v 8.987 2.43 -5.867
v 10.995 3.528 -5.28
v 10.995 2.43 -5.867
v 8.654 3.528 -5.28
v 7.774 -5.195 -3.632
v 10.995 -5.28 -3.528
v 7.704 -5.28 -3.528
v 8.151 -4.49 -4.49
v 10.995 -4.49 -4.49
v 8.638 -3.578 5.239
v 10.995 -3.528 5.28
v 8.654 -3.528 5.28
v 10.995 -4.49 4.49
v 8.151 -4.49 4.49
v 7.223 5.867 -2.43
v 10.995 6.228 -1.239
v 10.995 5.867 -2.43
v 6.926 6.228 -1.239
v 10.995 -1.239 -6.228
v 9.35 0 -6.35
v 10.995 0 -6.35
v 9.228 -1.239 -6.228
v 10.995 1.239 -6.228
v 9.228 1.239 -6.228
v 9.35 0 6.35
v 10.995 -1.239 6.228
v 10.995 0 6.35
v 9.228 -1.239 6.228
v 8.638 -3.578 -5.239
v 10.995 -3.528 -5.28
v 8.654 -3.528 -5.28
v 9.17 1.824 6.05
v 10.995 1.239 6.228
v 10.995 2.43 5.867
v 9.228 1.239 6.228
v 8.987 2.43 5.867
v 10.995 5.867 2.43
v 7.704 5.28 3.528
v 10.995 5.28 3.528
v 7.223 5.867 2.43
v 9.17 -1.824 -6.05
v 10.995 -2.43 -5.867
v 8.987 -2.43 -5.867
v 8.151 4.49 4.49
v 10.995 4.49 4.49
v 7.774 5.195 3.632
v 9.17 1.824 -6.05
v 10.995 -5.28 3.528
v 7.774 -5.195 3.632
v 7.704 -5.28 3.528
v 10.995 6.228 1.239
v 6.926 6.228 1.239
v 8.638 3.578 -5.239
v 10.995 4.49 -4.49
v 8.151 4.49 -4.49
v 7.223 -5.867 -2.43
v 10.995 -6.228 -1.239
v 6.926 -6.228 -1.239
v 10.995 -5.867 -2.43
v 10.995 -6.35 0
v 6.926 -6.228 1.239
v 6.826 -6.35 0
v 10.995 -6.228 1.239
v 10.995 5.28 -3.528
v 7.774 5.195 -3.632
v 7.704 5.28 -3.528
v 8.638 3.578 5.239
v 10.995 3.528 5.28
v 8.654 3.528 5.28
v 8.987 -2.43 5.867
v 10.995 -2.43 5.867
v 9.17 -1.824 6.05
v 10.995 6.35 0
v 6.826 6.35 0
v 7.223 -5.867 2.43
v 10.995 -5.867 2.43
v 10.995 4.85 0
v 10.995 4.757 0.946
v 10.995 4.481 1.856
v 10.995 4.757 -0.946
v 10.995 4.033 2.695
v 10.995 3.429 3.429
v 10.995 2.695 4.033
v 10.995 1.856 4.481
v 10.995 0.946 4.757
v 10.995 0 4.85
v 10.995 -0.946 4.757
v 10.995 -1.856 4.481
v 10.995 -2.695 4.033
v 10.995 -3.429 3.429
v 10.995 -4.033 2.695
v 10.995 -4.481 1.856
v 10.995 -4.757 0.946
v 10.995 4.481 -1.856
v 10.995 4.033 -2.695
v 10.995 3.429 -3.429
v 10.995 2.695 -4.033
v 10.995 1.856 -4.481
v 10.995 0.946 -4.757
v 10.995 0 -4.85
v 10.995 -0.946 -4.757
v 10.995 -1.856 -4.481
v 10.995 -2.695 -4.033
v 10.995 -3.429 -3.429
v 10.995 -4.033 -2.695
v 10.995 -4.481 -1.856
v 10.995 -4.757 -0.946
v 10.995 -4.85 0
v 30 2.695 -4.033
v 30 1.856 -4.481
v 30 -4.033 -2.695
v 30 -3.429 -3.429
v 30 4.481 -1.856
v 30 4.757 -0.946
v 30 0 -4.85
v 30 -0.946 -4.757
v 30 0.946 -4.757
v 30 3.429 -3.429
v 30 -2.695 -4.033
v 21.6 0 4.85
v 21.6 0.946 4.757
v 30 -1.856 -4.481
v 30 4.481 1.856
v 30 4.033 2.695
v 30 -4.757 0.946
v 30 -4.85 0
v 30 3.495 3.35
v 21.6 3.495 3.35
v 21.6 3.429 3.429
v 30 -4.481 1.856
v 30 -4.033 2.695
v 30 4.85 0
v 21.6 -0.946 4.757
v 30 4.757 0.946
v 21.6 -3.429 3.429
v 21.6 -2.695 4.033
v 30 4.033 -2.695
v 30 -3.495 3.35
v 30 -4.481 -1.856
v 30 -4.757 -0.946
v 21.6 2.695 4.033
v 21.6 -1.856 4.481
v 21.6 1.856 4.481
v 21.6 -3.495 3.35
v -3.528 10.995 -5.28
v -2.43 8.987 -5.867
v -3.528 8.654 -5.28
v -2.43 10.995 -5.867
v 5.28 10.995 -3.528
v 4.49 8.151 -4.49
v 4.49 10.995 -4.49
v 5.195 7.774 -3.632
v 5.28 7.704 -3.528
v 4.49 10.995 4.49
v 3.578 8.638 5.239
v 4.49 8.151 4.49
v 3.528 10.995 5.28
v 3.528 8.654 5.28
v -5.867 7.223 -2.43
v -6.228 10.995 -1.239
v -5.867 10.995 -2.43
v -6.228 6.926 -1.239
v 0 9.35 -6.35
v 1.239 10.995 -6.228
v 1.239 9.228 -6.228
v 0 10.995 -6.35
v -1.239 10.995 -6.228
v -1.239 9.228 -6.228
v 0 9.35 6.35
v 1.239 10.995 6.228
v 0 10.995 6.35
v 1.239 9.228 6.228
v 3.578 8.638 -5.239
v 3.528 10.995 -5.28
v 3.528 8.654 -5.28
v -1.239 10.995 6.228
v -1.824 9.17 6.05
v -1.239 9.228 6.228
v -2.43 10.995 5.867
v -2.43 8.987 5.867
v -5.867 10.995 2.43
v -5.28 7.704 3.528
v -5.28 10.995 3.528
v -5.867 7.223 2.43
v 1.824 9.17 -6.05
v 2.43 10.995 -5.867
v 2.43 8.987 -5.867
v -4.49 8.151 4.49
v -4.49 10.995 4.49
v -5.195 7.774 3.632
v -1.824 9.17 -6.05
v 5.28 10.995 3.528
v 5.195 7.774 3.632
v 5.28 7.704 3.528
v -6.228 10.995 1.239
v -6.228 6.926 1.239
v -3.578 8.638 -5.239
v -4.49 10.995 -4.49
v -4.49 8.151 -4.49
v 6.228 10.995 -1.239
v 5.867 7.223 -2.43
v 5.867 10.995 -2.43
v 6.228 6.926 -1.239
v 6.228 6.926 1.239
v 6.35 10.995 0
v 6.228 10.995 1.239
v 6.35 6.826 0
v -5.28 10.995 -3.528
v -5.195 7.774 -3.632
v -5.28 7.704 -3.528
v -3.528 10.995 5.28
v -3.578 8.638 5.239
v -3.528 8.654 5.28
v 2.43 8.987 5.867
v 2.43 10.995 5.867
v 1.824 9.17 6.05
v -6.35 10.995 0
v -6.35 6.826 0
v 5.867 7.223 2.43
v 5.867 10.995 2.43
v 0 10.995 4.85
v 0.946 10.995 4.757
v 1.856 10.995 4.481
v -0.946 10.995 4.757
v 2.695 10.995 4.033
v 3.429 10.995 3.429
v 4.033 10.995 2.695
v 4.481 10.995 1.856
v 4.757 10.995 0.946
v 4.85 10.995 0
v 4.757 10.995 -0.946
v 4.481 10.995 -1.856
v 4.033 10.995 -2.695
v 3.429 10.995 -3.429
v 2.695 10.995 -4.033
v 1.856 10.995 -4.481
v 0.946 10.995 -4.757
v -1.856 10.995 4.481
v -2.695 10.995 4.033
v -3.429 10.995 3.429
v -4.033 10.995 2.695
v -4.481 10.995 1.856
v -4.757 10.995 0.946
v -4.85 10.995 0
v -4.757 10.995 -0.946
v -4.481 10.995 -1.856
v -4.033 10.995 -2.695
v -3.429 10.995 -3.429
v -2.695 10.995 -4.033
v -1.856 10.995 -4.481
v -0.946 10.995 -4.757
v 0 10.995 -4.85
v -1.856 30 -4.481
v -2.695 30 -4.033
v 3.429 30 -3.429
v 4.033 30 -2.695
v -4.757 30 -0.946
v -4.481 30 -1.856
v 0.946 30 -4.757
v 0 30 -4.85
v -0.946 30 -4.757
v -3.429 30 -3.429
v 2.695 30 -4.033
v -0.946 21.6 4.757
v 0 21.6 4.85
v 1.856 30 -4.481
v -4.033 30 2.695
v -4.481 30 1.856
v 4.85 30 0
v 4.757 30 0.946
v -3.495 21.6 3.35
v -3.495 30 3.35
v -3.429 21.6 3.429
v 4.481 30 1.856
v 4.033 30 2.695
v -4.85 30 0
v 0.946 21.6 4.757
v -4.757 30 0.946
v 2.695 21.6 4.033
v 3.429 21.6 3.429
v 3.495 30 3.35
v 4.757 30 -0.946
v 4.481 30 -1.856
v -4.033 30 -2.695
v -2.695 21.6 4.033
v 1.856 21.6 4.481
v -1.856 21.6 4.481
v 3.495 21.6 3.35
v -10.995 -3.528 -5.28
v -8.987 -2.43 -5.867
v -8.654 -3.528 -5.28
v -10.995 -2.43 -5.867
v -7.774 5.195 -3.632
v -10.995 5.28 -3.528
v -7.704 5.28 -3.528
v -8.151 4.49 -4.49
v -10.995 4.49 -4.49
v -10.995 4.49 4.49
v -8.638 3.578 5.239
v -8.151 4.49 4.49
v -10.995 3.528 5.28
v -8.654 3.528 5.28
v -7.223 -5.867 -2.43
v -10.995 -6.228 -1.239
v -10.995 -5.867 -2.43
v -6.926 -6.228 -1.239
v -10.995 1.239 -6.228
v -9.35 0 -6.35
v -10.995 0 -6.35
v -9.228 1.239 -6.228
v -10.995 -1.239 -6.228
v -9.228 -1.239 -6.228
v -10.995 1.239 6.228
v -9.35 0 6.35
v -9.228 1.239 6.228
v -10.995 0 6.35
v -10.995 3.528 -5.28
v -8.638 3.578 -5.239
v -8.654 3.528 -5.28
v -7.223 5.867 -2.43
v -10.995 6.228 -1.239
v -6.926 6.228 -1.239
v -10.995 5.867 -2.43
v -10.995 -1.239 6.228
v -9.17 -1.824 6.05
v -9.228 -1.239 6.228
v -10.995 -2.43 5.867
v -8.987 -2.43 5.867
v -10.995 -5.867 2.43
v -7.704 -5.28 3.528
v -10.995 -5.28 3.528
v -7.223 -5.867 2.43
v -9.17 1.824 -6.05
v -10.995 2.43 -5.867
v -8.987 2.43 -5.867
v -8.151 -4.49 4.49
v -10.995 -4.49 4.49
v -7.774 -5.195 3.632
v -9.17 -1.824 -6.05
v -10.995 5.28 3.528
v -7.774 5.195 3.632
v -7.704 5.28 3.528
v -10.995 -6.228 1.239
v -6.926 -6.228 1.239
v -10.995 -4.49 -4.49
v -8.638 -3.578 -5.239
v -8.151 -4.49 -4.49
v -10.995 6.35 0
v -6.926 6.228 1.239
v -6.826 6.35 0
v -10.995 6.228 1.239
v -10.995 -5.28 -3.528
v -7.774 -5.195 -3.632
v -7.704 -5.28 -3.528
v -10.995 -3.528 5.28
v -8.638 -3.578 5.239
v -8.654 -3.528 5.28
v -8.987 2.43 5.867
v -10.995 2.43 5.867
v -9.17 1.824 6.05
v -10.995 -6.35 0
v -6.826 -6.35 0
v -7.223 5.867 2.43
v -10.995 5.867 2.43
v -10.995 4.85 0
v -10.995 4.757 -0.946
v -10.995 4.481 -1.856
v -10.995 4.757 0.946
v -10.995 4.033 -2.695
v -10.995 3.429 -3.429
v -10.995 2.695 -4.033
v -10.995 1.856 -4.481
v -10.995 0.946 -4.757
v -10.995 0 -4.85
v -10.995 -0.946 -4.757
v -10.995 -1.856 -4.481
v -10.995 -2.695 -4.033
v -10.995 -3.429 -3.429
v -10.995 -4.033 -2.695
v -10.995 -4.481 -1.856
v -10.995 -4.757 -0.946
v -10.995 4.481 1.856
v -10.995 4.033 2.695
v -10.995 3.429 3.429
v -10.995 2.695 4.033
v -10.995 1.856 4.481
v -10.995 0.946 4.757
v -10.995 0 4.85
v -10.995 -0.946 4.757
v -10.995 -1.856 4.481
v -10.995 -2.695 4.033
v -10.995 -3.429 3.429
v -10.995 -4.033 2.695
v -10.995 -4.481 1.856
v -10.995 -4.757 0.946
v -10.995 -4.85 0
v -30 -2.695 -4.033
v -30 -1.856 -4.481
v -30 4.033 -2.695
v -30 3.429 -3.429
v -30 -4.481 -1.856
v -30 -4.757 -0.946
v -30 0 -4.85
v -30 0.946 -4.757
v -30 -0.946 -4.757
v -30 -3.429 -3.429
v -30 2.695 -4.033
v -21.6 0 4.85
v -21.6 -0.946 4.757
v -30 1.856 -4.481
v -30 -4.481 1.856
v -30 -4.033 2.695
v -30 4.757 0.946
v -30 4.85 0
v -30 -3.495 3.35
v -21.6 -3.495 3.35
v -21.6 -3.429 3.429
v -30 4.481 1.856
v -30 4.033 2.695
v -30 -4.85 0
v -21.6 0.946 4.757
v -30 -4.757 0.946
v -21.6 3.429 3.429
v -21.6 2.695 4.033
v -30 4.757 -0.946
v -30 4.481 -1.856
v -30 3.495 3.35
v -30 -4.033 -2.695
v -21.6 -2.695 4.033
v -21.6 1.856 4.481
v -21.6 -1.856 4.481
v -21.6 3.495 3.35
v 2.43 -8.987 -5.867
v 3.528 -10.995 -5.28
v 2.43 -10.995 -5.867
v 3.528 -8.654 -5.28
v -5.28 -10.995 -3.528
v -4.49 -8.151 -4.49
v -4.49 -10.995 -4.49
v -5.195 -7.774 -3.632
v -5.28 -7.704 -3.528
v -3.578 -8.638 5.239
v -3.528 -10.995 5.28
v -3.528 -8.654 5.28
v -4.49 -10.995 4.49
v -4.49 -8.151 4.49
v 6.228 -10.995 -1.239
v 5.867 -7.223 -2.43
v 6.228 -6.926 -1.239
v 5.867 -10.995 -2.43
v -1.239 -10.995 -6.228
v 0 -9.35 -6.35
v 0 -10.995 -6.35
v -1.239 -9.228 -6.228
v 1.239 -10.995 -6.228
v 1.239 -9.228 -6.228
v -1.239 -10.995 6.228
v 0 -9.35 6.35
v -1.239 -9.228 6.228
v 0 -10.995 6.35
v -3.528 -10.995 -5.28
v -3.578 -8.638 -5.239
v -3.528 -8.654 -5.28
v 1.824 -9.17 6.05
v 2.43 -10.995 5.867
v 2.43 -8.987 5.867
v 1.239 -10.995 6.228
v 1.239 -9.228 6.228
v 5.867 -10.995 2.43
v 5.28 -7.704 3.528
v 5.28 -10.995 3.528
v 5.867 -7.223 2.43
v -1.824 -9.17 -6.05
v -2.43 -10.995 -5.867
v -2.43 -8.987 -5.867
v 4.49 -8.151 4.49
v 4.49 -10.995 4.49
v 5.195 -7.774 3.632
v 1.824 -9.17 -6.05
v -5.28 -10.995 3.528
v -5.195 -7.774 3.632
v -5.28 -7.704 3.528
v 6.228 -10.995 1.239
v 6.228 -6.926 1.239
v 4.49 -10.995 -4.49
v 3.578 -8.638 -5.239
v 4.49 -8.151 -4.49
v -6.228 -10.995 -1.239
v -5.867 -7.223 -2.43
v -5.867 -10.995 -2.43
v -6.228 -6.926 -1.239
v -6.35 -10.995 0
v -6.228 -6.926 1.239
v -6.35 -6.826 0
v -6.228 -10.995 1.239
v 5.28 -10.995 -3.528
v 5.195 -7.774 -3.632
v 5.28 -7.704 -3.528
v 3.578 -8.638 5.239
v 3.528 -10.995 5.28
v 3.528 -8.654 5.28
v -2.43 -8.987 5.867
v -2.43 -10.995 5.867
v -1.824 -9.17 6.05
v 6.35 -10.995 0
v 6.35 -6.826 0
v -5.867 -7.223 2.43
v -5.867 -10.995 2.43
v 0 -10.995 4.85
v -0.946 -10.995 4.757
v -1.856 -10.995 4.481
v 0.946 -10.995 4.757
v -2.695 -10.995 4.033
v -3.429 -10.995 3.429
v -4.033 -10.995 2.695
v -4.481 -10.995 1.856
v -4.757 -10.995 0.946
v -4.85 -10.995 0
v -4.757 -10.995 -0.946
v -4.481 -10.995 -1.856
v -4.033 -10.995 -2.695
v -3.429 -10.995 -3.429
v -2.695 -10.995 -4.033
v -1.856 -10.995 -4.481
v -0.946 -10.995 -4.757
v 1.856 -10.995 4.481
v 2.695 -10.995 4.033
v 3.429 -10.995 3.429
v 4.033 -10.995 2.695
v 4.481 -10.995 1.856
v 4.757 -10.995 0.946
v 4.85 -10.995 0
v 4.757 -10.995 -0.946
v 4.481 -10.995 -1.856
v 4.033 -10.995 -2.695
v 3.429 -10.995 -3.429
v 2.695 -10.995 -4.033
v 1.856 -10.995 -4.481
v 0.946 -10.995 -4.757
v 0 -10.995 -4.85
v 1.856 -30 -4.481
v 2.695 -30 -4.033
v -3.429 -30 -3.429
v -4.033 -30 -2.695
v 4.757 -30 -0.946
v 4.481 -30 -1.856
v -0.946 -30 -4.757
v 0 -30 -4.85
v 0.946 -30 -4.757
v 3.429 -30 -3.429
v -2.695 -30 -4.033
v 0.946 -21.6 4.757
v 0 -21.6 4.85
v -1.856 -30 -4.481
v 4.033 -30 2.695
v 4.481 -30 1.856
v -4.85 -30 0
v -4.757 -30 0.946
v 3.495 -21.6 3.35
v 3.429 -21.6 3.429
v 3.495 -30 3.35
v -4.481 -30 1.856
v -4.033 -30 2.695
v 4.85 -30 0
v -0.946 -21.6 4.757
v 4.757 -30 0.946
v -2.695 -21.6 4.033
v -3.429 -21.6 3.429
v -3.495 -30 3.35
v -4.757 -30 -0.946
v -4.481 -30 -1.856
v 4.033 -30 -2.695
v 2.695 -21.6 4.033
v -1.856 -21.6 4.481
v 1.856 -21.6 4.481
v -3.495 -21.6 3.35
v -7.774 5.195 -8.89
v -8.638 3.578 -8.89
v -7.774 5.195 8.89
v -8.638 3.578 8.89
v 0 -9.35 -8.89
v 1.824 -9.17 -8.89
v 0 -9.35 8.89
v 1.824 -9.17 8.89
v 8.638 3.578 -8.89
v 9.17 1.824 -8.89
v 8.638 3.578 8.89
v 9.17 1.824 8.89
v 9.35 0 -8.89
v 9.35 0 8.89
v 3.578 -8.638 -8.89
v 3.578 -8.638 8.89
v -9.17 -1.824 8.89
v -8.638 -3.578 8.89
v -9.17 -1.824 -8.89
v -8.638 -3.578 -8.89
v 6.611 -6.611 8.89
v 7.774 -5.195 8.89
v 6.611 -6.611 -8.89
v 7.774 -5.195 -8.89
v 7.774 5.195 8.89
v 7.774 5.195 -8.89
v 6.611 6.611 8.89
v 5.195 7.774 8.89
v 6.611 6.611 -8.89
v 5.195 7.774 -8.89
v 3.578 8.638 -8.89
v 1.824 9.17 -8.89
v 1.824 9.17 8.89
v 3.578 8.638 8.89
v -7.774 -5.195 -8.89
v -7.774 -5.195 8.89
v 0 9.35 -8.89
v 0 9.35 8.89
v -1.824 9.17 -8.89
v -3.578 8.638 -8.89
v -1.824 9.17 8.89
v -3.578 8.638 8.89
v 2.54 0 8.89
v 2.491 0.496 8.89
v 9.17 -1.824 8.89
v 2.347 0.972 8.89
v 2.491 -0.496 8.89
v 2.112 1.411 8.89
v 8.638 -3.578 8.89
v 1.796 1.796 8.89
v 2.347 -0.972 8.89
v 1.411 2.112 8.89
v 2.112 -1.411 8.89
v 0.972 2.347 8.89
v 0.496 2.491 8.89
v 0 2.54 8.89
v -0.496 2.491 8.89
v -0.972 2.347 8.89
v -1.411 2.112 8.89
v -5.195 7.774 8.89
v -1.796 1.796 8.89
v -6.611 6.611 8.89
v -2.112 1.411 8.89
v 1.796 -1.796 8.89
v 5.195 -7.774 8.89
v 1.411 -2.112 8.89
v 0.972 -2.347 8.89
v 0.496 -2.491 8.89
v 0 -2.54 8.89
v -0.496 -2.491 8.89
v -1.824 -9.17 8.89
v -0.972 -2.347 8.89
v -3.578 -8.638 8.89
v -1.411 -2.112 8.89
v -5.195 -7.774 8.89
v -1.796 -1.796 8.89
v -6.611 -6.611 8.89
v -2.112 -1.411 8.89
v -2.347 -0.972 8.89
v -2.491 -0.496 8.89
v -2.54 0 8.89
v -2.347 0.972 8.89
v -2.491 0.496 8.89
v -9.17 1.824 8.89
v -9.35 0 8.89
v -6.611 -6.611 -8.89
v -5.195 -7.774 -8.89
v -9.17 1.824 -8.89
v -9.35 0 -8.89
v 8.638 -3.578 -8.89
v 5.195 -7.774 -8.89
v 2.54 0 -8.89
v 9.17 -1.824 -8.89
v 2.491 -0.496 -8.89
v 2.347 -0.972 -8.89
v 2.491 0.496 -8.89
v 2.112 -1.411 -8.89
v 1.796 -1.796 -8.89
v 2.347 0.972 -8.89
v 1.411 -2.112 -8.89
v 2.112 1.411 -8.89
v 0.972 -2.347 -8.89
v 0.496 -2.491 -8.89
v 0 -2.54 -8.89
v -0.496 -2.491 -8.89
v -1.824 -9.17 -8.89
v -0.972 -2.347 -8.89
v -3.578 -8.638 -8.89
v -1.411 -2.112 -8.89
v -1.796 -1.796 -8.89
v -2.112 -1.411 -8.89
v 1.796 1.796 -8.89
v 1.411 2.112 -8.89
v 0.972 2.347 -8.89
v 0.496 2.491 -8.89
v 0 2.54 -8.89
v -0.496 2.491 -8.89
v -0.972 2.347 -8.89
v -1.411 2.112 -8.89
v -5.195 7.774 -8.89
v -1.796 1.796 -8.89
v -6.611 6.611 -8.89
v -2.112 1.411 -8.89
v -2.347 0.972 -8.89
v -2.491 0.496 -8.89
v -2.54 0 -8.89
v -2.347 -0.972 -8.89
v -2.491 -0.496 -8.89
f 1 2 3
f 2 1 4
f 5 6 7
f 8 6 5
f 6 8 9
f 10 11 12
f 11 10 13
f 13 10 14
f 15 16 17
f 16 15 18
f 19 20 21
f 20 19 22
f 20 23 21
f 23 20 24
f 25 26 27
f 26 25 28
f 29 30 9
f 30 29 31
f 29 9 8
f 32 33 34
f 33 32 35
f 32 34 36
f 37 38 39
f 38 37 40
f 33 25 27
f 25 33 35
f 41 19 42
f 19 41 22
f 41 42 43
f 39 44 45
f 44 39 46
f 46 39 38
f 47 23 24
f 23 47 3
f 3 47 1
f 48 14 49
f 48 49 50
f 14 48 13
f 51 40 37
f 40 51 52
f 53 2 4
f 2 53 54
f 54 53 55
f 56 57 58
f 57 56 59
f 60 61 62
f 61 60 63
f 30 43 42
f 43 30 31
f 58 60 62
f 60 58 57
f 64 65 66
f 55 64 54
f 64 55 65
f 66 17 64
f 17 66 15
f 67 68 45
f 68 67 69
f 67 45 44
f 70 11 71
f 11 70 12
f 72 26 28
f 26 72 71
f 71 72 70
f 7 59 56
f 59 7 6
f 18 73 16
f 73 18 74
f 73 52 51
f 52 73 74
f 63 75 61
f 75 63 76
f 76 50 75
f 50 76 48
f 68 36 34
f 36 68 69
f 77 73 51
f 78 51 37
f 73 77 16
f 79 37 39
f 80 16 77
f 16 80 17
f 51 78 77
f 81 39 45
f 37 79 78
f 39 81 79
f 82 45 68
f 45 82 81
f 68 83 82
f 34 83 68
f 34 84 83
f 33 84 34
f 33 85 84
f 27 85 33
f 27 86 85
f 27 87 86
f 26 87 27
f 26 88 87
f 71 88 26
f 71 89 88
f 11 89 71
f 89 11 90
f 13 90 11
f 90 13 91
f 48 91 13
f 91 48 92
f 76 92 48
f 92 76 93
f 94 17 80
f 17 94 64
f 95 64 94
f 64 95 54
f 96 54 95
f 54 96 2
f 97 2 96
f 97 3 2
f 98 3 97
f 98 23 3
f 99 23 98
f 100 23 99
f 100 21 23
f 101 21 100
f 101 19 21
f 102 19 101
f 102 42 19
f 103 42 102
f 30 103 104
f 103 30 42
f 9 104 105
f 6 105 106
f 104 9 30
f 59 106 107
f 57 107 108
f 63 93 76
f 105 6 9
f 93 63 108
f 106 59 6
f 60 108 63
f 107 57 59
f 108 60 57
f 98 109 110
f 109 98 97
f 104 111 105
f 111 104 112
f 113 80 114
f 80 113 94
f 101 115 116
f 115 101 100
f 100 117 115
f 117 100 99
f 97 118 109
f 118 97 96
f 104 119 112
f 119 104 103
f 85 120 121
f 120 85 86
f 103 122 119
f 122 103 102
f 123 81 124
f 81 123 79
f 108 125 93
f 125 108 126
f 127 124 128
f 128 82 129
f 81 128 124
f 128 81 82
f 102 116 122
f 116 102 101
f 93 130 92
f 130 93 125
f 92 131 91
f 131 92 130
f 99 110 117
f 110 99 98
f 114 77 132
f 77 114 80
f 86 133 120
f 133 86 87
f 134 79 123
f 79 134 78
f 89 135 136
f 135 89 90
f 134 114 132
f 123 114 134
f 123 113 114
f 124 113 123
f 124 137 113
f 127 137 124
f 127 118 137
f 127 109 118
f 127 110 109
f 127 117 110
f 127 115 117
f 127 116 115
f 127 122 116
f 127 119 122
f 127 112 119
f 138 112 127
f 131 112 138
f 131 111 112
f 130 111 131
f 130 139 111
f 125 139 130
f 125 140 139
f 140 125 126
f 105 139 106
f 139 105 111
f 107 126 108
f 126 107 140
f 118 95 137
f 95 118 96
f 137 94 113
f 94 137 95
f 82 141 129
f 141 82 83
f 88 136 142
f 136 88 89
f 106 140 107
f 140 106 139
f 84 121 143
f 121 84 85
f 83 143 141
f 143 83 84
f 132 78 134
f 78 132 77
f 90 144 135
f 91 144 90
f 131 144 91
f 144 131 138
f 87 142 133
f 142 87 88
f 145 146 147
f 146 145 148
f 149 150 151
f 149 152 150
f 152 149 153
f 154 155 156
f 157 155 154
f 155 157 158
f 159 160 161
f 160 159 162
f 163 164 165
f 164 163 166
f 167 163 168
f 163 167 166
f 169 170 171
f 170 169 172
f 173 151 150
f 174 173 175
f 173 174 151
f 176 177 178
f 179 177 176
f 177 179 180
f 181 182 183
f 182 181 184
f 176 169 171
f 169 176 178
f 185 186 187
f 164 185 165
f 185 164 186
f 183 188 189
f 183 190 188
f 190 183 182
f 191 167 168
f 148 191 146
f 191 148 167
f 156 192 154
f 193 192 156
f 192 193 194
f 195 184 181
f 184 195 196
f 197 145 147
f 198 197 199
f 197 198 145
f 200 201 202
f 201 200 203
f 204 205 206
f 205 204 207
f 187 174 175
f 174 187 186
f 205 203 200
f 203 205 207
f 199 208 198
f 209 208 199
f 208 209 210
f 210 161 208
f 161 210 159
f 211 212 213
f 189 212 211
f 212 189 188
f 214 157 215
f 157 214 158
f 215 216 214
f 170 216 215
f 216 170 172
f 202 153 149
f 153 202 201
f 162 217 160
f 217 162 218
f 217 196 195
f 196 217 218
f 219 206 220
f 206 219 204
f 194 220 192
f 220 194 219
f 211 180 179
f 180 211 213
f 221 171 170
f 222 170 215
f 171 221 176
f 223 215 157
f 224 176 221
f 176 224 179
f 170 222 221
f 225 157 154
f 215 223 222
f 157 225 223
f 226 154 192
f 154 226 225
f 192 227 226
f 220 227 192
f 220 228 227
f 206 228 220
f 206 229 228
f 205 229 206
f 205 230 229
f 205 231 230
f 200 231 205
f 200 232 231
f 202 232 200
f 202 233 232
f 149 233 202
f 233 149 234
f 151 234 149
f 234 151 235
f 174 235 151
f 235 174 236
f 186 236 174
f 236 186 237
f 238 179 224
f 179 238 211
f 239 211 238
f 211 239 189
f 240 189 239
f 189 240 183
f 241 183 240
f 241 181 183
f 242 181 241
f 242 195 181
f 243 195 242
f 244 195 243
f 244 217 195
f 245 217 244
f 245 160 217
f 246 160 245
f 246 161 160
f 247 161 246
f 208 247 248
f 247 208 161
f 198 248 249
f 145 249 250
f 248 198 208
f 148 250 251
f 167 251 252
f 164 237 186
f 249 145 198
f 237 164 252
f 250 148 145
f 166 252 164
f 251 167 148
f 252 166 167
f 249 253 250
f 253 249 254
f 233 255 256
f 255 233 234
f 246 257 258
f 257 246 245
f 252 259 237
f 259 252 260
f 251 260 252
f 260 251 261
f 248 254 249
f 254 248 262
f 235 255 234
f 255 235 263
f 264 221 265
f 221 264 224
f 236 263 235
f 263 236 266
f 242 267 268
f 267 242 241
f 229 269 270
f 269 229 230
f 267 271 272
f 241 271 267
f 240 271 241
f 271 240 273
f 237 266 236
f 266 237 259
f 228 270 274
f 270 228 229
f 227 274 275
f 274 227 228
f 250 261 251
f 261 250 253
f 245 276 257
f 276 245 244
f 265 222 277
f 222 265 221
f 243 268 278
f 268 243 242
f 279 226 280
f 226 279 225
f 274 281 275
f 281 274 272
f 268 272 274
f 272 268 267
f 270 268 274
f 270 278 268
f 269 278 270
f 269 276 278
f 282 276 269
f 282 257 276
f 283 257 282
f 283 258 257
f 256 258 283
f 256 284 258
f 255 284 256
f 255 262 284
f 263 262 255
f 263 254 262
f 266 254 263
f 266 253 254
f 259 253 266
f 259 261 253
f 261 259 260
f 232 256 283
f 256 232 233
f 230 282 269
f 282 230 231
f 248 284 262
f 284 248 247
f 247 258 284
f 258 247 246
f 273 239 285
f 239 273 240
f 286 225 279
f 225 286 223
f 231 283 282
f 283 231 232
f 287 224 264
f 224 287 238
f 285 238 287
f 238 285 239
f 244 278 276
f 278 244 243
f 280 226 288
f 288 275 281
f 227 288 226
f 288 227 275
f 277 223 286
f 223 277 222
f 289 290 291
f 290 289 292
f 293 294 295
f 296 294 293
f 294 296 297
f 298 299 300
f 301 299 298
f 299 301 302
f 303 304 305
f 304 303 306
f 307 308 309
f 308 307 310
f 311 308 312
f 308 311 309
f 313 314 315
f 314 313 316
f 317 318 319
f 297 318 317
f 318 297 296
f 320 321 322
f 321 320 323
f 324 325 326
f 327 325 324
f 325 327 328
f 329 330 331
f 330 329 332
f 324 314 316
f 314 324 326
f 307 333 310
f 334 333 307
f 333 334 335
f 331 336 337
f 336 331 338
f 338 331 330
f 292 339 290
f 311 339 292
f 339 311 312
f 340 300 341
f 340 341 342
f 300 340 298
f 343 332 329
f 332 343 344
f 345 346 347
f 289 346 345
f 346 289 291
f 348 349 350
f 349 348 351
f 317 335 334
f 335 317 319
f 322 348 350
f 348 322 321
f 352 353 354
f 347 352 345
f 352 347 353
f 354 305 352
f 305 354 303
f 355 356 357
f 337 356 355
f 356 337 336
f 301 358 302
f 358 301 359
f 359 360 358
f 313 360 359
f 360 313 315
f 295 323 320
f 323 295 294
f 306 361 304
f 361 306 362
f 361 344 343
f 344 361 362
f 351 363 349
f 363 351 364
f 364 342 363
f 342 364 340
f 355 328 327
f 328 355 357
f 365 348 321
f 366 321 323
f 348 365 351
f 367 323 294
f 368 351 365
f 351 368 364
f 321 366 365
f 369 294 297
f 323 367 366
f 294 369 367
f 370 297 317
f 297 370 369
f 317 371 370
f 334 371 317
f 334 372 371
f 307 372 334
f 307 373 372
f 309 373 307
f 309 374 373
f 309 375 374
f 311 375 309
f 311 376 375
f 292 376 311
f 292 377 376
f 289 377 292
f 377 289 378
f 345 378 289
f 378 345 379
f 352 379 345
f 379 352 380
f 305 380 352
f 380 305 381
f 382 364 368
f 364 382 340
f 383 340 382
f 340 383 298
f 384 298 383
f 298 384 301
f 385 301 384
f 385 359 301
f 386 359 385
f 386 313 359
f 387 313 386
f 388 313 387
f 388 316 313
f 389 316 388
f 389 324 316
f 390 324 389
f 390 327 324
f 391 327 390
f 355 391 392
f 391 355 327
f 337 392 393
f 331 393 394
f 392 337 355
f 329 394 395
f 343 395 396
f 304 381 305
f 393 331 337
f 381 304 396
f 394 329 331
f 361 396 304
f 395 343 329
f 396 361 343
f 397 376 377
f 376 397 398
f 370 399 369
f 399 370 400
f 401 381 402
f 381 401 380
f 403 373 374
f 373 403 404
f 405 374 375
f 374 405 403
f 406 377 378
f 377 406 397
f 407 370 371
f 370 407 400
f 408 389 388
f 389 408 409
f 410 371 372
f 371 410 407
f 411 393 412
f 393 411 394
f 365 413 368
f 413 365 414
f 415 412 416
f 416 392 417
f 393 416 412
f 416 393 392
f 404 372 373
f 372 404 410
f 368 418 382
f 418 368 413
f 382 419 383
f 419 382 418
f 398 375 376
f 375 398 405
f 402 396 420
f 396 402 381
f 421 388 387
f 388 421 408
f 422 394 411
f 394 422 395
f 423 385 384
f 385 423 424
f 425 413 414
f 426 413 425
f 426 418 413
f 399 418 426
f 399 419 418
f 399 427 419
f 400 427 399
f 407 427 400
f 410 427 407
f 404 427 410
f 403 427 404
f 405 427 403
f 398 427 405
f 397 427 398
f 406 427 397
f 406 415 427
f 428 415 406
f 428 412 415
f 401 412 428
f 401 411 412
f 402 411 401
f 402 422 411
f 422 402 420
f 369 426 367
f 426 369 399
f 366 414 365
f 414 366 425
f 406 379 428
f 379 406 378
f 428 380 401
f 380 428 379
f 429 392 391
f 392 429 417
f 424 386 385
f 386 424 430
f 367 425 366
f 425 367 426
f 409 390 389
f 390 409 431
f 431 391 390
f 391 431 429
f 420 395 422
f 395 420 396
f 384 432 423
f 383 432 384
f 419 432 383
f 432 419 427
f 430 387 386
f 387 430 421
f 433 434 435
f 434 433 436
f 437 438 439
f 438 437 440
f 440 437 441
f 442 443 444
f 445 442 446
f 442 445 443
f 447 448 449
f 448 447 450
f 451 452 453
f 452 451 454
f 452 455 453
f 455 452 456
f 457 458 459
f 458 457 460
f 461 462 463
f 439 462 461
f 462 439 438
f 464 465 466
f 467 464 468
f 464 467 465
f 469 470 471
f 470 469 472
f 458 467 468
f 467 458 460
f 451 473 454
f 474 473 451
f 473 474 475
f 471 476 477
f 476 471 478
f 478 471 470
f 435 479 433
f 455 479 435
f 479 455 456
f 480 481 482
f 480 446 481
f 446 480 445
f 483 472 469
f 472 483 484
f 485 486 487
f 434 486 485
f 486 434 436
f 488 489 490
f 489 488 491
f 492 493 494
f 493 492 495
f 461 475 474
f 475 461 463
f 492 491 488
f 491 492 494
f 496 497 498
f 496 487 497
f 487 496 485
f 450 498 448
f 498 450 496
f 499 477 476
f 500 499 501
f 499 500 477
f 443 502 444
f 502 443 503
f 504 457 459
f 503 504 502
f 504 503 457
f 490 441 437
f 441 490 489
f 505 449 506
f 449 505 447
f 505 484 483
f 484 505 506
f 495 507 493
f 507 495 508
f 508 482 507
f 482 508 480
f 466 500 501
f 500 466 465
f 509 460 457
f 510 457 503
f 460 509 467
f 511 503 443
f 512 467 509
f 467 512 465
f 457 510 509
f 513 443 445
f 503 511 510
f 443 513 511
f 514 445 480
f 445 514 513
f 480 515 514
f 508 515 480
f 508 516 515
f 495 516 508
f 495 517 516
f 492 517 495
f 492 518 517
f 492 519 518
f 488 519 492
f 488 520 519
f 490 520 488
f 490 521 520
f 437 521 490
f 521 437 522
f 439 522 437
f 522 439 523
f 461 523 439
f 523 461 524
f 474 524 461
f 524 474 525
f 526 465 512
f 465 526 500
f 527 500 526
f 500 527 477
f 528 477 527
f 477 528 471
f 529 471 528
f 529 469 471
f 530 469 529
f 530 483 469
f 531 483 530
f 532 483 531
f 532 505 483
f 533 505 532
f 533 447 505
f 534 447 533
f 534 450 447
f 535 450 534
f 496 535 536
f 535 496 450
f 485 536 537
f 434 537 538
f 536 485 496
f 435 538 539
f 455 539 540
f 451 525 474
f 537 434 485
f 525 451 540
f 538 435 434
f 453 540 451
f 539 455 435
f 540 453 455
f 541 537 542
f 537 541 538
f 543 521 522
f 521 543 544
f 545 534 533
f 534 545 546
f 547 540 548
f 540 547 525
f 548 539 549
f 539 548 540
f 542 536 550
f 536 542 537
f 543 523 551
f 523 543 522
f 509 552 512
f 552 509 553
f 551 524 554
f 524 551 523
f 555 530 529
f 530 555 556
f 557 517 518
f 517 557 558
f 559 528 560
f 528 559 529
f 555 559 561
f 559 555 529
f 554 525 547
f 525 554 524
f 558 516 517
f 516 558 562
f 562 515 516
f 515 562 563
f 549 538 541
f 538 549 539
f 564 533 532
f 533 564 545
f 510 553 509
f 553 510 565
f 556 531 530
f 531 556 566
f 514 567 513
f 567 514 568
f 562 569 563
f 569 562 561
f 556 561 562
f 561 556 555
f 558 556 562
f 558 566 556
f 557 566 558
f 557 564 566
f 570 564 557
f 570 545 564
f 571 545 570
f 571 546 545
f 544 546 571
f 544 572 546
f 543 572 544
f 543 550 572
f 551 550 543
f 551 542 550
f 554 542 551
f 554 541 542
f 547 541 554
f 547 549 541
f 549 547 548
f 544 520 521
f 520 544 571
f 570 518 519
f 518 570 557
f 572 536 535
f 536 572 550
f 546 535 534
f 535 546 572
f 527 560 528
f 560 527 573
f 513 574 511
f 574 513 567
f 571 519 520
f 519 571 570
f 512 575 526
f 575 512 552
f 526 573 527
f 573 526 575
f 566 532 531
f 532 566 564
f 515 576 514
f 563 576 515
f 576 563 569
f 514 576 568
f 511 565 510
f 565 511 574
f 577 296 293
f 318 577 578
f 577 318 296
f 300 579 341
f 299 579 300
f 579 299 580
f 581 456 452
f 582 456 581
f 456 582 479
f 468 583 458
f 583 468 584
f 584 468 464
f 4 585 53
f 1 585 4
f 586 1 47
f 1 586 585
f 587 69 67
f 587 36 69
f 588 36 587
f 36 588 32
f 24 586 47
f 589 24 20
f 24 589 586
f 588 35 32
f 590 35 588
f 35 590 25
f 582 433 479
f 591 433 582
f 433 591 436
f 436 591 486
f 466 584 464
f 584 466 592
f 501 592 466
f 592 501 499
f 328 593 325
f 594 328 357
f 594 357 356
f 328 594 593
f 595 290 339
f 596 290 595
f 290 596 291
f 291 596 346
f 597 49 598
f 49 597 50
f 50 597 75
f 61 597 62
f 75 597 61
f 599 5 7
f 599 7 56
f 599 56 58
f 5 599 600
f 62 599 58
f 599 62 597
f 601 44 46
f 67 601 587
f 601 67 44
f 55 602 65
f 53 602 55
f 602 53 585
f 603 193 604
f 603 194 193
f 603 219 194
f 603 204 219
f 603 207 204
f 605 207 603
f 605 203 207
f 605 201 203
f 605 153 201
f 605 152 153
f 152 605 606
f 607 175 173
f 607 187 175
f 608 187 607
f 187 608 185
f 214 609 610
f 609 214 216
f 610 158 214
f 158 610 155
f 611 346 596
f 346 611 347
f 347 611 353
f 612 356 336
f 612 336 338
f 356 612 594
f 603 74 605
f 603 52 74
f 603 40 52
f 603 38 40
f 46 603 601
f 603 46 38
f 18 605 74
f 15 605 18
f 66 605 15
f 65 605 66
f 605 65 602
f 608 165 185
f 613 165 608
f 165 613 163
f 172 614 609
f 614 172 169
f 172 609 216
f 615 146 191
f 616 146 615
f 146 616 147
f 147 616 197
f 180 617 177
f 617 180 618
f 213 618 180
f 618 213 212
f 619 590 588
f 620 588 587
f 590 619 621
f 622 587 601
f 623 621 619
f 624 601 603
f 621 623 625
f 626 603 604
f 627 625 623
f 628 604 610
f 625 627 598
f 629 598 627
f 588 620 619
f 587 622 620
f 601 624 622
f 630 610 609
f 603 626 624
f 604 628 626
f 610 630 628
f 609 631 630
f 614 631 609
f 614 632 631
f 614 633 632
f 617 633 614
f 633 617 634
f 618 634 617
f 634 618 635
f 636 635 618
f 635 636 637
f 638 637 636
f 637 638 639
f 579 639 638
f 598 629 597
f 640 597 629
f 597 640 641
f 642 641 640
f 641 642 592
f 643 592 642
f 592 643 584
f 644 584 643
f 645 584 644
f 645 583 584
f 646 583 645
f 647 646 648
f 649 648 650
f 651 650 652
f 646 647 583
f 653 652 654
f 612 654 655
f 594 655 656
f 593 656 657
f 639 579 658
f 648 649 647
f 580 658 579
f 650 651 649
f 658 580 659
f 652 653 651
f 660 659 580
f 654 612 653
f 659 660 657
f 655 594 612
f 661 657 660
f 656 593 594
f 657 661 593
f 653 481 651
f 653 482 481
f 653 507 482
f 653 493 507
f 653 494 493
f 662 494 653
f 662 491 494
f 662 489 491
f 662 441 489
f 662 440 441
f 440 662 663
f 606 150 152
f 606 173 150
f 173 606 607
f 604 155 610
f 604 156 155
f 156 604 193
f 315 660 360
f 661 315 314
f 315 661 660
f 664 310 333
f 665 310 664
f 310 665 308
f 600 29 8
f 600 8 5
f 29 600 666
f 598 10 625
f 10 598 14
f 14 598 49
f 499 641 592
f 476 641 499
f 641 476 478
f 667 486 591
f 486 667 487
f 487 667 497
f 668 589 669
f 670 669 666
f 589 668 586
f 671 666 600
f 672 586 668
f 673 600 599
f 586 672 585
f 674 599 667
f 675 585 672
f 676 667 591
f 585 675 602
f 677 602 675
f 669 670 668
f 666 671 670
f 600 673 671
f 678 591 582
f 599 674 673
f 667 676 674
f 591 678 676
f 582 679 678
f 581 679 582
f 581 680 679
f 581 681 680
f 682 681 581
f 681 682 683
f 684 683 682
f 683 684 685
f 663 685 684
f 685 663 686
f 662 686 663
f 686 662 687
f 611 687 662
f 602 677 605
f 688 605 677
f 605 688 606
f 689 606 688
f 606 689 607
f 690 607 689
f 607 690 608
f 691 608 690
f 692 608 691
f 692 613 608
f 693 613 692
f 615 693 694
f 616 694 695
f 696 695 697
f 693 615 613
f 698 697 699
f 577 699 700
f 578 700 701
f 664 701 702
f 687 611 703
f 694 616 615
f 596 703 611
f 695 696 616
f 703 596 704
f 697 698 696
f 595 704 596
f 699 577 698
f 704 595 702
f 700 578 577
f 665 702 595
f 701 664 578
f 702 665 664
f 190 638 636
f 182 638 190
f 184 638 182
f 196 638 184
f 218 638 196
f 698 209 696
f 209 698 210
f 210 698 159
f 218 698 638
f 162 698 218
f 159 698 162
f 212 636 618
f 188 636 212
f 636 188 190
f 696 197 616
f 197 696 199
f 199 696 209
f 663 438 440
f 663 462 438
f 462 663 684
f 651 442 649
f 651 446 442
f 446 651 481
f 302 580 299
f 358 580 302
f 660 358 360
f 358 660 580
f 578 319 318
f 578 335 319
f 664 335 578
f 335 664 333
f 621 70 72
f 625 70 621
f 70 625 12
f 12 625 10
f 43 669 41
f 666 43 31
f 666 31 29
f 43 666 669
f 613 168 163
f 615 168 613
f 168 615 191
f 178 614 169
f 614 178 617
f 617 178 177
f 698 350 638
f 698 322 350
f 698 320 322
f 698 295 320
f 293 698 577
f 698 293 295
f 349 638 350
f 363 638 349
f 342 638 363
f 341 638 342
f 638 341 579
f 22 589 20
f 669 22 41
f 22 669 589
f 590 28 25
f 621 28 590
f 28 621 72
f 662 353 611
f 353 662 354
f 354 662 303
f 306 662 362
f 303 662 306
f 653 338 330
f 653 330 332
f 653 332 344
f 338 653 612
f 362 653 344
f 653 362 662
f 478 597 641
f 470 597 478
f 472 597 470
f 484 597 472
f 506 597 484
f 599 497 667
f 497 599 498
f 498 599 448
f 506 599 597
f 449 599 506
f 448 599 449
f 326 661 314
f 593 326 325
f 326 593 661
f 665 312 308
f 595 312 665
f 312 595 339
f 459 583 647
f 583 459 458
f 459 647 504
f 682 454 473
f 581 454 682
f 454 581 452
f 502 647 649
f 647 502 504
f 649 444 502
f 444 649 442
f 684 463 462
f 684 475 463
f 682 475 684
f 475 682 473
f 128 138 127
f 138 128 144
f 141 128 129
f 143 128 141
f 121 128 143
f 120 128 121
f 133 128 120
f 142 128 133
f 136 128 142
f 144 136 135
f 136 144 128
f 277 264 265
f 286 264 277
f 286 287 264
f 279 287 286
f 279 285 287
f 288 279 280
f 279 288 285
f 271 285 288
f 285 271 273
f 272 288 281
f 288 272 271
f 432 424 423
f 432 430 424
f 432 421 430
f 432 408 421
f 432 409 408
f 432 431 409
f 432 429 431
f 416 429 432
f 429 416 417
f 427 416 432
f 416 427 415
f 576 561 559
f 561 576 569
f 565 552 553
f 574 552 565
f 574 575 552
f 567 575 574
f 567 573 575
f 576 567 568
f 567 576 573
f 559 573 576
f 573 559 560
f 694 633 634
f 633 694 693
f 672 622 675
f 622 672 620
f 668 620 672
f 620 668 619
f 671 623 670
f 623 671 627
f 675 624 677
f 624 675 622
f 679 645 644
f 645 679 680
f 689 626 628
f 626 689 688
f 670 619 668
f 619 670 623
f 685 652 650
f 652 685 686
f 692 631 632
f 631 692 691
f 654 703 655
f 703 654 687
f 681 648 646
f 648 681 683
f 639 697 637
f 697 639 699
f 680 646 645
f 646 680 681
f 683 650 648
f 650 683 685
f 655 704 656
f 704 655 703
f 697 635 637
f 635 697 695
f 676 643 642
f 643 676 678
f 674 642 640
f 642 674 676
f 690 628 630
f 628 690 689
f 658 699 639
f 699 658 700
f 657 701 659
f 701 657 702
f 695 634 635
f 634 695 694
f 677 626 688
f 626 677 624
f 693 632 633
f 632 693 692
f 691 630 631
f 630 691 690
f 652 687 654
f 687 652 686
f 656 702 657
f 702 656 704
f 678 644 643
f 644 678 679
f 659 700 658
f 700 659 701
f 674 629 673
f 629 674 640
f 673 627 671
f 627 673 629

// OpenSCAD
$fn = 32;

// ----------------------------------------------------------------------
// Cardan cross: 60 mm span, 12.7 mm trunnions
// ----------------------------------------------------------------------

// --- parameters (mm) ---
journal_d = 12.7;         // trunnion diameter
arm_len = 30;             // trunnion length from the centre
step_r = 4.32;            // step position from the centre
step_d = 9.7;             // journal diameter after the step
hub_d = 18.7;             // hub diameter
hub_h = 17.78;            // hub height
bore_d = 5.08;            // hub bore
flat_d = 1.5;             // depth of the journal flat
flat_len = 8.4;           // length of the journal flat

difference() {
  union() {
    /* hub along the joint axis */
    cylinder(h = hub_h, d = hub_d, center = true);
    for (a = [0 : 90 : 270]) rotate([0, 0, a]) {
      /* trunnion, sunk into the hub */
      translate([hub_d / 4, 0, 0]) rotate([0, 90, 0]) cylinder(h = step_r + 2, d = journal_d);
      /* stepped journal out to the tip */
      translate([step_r - 0.5, 0, 0]) rotate([0, 90, 0]) cylinder(h = arm_len + 0.5 - step_r, d = step_d);
    }
  }
  /* lubrication bore through the hub, 2.5 mm clear on both sides */
  translate([0, 0, -hub_h / 2 - 2.5]) cylinder(h = hub_h + 5, d = bore_d);
  /* machined flat on each journal tip */
  for (a = [0 : 90 : 270]) rotate([0, 0, a]) {
    translate([arm_len - flat_len, -step_d, step_d / 2 - flat_d]) cube([flat_len + 0.5, 2 * step_d, flat_d + 2.5]);
  }
}
